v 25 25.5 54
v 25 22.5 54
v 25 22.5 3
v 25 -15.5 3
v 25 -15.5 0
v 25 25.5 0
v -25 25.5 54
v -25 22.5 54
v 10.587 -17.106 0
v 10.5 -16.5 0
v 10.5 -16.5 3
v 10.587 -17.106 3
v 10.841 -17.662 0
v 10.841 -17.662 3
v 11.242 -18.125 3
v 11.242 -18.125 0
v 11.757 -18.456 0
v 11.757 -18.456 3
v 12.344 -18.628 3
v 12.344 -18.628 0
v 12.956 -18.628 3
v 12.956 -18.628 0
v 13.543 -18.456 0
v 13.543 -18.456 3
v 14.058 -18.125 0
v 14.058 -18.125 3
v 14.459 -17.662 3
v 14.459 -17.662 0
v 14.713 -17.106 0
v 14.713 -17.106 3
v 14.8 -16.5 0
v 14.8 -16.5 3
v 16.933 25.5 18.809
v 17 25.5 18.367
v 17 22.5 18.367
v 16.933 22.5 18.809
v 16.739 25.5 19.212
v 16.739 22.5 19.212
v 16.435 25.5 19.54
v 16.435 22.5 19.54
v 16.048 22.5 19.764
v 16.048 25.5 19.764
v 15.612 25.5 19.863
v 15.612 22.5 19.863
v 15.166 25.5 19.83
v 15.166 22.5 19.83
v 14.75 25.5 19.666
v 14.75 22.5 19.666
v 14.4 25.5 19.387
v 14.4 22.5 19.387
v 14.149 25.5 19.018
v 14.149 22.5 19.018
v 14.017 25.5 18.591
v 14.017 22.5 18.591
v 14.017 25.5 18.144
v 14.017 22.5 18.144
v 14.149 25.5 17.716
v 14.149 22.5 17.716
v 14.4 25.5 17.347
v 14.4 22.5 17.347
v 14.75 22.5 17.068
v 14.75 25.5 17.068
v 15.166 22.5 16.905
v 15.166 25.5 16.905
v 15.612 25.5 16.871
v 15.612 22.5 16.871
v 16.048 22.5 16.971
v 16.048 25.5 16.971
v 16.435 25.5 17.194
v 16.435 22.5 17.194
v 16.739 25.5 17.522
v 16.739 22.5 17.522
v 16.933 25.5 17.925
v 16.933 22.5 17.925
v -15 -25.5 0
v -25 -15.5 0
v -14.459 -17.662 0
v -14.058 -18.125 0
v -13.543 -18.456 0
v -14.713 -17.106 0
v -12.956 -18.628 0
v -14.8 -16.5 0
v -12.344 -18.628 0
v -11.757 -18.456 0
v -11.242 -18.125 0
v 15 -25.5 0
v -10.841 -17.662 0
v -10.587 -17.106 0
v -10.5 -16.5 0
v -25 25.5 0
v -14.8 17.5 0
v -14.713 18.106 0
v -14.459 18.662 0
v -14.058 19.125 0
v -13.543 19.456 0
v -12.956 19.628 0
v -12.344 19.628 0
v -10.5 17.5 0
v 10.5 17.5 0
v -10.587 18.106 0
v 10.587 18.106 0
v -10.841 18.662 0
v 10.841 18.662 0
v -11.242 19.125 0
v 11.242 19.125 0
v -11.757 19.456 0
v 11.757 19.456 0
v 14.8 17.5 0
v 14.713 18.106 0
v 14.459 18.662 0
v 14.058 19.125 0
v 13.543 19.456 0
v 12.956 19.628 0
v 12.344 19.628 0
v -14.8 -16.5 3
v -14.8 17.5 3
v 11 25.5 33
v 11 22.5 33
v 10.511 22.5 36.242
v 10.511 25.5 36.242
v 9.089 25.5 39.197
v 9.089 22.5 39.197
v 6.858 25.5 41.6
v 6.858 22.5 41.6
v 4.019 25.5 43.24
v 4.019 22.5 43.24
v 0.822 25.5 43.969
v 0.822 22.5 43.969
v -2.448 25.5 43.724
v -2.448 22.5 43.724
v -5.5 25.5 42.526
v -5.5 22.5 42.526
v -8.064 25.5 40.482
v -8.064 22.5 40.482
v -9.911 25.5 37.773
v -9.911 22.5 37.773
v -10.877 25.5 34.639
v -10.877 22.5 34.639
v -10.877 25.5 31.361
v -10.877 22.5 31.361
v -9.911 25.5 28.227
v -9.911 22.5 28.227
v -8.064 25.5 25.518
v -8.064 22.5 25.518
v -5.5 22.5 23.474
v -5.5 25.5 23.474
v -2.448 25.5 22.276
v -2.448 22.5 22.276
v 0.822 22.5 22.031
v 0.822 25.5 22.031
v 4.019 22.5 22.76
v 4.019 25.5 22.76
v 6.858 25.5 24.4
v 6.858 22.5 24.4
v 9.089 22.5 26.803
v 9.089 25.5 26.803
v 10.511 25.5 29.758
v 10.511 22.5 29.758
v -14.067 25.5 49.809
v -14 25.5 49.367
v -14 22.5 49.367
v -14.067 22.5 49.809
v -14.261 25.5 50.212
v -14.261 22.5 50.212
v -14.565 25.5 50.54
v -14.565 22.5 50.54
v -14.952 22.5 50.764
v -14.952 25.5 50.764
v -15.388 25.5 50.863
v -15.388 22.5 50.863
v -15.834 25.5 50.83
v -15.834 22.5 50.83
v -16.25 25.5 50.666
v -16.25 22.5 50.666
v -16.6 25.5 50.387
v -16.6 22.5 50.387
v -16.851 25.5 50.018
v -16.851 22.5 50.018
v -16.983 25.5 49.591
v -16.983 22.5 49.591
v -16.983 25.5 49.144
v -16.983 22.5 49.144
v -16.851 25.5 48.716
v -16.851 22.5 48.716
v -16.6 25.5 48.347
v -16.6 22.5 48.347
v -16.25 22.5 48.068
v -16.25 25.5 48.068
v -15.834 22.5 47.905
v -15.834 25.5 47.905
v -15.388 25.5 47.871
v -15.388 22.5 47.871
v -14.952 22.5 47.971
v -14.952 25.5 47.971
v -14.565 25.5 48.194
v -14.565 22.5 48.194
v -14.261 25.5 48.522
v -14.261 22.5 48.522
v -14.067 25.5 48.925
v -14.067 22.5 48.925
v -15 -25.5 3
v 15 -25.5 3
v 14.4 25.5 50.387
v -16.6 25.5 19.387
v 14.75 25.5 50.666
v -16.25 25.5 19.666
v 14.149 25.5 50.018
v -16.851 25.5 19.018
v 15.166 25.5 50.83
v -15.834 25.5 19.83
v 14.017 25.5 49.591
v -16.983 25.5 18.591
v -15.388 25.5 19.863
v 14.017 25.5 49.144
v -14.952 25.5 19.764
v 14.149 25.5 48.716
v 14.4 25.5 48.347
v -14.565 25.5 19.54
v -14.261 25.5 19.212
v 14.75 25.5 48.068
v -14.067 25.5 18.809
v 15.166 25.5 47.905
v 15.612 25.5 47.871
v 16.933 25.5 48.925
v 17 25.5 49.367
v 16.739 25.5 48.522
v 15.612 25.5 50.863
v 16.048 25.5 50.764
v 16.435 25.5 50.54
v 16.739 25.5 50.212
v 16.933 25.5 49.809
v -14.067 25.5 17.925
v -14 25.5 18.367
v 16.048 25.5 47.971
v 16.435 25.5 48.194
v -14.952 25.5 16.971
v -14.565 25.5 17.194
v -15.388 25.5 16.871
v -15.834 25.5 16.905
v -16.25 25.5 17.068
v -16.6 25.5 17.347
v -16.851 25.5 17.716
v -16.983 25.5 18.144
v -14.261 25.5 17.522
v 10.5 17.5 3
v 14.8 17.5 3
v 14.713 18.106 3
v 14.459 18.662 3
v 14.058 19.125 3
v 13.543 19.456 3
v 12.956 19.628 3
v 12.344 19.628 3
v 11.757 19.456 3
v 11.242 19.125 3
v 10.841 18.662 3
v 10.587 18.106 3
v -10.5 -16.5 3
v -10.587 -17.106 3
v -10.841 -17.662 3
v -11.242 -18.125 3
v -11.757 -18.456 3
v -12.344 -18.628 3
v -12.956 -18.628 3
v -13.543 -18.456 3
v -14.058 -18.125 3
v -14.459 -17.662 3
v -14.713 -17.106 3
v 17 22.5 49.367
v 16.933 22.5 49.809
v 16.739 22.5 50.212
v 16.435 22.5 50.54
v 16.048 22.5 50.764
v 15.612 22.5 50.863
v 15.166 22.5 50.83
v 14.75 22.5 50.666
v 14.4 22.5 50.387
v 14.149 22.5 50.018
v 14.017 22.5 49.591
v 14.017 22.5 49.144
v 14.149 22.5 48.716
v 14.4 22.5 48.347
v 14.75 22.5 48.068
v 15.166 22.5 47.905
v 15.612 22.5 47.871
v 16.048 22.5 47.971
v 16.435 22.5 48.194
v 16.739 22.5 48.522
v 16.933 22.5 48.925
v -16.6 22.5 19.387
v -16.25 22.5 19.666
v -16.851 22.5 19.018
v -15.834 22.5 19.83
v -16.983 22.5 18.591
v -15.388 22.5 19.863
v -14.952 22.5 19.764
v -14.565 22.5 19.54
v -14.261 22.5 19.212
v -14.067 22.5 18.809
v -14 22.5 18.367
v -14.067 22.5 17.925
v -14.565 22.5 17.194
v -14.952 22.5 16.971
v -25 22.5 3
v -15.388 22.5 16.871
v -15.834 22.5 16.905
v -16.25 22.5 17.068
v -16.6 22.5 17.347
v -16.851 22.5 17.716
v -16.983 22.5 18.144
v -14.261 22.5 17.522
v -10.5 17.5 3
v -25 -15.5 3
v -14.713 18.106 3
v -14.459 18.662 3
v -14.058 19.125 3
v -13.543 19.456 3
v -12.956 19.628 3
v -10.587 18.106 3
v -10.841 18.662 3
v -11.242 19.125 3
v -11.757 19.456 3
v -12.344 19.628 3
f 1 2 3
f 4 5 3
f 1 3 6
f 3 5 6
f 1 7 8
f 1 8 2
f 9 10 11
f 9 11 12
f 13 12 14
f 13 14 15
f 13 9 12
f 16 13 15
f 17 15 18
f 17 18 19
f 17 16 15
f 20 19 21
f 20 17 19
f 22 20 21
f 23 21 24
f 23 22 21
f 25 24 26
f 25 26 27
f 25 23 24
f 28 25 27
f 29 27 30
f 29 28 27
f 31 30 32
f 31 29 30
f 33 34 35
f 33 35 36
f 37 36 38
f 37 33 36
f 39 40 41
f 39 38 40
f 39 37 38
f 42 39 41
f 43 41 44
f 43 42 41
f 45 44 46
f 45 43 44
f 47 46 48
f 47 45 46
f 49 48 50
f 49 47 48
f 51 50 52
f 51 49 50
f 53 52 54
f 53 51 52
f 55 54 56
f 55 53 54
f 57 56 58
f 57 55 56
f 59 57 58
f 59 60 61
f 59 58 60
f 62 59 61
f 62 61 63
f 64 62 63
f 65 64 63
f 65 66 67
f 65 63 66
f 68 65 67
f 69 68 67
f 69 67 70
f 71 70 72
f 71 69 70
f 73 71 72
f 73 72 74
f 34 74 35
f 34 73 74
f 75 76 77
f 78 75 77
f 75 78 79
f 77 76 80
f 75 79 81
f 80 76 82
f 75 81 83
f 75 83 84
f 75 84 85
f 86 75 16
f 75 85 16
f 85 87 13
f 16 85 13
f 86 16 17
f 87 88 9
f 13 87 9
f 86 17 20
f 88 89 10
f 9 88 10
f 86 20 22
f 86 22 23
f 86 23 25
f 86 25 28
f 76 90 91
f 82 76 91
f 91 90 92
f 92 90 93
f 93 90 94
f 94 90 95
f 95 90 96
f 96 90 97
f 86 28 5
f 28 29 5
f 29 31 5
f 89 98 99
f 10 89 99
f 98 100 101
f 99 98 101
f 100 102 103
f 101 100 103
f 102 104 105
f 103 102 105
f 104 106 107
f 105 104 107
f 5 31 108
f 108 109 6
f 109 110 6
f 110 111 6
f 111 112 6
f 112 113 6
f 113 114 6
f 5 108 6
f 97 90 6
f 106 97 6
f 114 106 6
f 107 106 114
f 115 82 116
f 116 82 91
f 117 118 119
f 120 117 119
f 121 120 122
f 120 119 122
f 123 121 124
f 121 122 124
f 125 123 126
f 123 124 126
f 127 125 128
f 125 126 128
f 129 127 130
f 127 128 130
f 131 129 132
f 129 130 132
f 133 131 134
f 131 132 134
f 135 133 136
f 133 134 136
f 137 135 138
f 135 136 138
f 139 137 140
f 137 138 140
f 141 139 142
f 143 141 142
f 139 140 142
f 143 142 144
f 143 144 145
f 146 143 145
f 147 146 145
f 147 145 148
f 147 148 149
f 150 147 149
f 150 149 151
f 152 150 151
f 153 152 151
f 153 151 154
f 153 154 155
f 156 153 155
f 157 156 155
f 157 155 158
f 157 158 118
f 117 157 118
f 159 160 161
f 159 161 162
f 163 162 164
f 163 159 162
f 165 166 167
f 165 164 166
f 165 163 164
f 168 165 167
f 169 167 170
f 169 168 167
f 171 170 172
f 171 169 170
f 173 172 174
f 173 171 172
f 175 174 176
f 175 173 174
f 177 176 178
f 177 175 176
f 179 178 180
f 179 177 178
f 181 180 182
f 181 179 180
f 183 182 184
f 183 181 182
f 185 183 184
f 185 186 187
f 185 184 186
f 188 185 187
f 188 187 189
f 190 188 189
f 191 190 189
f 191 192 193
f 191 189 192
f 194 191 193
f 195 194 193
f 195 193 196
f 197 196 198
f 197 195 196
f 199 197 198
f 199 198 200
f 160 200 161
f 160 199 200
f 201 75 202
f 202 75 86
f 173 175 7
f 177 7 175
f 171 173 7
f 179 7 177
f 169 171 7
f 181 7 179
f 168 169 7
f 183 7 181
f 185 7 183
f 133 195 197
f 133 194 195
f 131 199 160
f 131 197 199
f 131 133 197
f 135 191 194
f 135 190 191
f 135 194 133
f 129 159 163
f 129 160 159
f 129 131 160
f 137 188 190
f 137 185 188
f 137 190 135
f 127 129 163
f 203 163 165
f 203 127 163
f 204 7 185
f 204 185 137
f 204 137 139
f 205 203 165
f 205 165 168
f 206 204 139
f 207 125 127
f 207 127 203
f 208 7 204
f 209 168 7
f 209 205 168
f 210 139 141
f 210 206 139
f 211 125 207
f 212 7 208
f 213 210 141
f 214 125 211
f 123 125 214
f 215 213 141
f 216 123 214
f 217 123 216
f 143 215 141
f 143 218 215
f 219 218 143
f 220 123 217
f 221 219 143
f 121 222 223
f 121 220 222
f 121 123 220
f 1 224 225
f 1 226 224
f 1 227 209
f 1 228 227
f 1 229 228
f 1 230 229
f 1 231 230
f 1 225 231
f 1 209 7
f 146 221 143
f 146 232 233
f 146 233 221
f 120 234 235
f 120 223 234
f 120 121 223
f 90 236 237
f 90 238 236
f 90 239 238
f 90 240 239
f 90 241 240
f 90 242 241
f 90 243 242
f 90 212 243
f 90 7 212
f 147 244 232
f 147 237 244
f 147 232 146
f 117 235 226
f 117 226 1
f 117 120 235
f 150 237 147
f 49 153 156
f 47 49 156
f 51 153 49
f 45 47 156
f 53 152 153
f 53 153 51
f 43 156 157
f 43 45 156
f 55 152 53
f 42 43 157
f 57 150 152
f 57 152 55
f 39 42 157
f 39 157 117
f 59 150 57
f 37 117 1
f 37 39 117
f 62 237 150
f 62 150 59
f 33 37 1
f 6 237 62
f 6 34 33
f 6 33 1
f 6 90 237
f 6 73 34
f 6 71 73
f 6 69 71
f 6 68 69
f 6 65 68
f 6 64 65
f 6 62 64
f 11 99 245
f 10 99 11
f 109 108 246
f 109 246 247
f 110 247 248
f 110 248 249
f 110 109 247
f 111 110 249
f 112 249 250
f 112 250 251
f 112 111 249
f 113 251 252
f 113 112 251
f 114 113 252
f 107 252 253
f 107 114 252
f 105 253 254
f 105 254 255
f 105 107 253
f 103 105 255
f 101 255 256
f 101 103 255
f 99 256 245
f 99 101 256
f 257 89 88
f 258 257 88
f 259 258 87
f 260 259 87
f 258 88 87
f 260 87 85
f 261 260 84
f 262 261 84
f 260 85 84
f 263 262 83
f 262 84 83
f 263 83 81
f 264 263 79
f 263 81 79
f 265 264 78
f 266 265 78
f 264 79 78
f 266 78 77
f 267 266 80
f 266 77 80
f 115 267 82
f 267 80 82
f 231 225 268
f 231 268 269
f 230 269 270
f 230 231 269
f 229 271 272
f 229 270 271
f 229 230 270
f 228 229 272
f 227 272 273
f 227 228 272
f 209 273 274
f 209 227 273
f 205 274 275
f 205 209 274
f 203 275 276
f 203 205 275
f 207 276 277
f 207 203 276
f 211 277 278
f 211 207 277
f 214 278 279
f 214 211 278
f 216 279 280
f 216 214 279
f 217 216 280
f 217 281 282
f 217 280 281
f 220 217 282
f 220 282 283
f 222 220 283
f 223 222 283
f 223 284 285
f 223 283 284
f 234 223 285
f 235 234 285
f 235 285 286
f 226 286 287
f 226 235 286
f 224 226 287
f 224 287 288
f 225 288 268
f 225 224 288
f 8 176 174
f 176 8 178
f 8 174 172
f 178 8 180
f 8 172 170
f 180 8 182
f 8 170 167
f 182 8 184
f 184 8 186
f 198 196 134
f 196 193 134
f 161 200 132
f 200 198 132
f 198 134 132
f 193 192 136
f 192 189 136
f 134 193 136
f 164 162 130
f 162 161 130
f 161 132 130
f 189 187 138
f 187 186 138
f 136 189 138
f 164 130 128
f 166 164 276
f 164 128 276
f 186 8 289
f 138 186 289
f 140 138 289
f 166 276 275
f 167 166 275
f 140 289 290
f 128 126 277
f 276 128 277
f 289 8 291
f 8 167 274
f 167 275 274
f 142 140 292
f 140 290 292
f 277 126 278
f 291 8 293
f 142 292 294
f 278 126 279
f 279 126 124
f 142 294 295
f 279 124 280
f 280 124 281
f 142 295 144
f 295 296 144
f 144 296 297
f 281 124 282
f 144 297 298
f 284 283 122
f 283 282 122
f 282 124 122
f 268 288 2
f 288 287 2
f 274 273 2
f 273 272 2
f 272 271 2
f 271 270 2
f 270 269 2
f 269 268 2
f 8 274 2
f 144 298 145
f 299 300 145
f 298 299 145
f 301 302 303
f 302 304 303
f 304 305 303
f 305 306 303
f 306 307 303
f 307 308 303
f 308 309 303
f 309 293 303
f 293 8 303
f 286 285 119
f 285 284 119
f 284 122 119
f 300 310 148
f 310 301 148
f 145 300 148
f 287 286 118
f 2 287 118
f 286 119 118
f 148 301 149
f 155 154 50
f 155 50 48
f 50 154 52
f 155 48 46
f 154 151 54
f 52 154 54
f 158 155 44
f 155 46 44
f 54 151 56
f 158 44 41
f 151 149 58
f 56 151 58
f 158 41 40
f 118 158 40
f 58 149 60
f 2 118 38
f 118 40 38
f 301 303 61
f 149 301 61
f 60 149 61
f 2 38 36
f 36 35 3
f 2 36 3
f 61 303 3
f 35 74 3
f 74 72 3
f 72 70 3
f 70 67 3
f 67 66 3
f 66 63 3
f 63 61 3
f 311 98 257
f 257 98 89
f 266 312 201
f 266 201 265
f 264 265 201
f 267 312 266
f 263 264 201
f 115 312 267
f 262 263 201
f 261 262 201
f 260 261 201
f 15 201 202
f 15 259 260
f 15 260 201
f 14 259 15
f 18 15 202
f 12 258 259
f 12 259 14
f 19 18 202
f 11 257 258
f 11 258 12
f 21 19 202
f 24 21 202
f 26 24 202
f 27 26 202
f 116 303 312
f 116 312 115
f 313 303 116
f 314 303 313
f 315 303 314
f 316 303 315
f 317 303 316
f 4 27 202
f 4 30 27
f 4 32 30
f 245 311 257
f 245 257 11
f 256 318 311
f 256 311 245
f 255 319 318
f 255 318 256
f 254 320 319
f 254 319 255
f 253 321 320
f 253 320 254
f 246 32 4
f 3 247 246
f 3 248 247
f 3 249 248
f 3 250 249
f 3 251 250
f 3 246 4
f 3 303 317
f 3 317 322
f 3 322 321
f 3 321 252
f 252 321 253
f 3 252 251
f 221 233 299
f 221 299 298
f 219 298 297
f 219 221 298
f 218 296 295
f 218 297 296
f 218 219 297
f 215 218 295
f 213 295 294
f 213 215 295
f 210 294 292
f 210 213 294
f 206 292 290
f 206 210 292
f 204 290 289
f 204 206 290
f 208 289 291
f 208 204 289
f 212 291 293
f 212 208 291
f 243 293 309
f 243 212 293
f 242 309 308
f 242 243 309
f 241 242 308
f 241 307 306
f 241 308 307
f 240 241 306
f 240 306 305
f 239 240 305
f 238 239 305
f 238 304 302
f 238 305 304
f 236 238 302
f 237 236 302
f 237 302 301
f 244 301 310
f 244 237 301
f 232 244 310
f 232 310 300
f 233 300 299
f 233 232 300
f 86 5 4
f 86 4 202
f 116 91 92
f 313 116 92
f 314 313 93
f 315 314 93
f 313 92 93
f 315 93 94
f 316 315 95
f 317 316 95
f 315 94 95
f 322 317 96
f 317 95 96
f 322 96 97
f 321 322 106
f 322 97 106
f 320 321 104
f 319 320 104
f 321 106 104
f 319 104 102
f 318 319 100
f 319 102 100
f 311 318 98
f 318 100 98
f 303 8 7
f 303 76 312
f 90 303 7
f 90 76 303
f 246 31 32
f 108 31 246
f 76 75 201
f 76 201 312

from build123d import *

# Parameters (mm, degrees)
SKETCH1_W               = 50
SKETCH1_H               = 51
BOSS_EXTRUDE1_DEPTH     = 3
CUT_EXTRUDE_THIN1_DEPTH = 3
SKETCH4_W               = 50
SKETCH4_H               = 3
BOSS_EXTRUDE2_DEPTH     = 51
SKETCH5_R               = 11
CUT_EXTRUDE1_DEPTH      = 77.452599694
CUT_EXTRUDE2_DEPTH      = 77.452599694
CUT_EXTRUDE2_DEPTH_BACK = 77.452599694
SKETCH6_R               = 1.5


with BuildPart() as part:
    # Sketch1 → Boss-Extrude1 (new body)
    with BuildSketch(Plane.XY):
        Rectangle(SKETCH1_W, SKETCH1_H)
        with BuildLine():
            Line((-10.5, 17.5), (-10.5, -16.5))
            ThreePointArc((-10.5, -16.5), (-12.65, -18.65), (-14.8, -16.5))
            Line((-14.8, -16.5), (-14.8, 17.5))
            ThreePointArc((-14.8, 17.5), (-12.65, 19.65), (-10.5, 17.5))
        make_face(mode=Mode.SUBTRACT)
        with BuildLine():
            Line((10.5, 17.5), (10.5, -16.5))
            ThreePointArc((10.5, -16.5), (12.65, -18.65), (14.8, -16.5))
            Line((14.8, -16.5), (14.8, 17.5))
            ThreePointArc((14.8, 17.5), (12.65, 19.65), (10.5, 17.5))
        make_face(mode=Mode.SUBTRACT)
    extrude(amount=BOSS_EXTRUDE1_DEPTH)

    # Sketch3 → Cut-Extrude-Thin1 (cut)
    with BuildSketch(Plane(origin=(0, 0, 0), x_dir=(-1, 0, 0), z_dir=(0, 0, -1))):
        Polygon((-25, -15.5), (-15, -25.5), (-22.071067812, -32.571067812), (-32.071067812, -22.571067812), align=None)
        Polygon((15, -25.5), (25, -15.5), (32.071067812, -22.571067812), (22.071067812, -32.571067812), align=None)
    extrude(amount=-CUT_EXTRUDE_THIN1_DEPTH, mode=Mode.SUBTRACT)

    # Sketch4 → Boss-Extrude2 (add)
    with BuildSketch(Plane.XY.offset(3)):
        with Locations((0, 24)):
            Rectangle(SKETCH4_W, SKETCH4_H)
    extrude(amount=BOSS_EXTRUDE2_DEPTH)

    # Sketch5 → Cut-Extrude1 (cut, through all)
    with BuildSketch(Plane.XZ.offset(-22.5)):
        with Locations((0, 33)):
            Circle(SKETCH5_R)
    extrude(amount=-CUT_EXTRUDE1_DEPTH, mode=Mode.SUBTRACT)

    # Sketch6 → Cut-Extrude2 (cut, two sides: drawn at the far end of the back side and taken through both)
    with BuildSketch(Plane.XZ.offset(-22.5).offset(-CUT_EXTRUDE2_DEPTH_BACK)):
        with Locations((-15.5, 49.36722171)):
            Circle(SKETCH6_R)
        with Locations((-15.5, 18.36722171)):
            Circle(SKETCH6_R)
        with Locations((15.5, 18.36722171)):
            Circle(SKETCH6_R)
        with Locations((15.5, 49.36722171)):
            Circle(SKETCH6_R)
    extrude(amount=CUT_EXTRUDE2_DEPTH + CUT_EXTRUDE2_DEPTH_BACK, mode=Mode.SUBTRACT)


solid = part.part
